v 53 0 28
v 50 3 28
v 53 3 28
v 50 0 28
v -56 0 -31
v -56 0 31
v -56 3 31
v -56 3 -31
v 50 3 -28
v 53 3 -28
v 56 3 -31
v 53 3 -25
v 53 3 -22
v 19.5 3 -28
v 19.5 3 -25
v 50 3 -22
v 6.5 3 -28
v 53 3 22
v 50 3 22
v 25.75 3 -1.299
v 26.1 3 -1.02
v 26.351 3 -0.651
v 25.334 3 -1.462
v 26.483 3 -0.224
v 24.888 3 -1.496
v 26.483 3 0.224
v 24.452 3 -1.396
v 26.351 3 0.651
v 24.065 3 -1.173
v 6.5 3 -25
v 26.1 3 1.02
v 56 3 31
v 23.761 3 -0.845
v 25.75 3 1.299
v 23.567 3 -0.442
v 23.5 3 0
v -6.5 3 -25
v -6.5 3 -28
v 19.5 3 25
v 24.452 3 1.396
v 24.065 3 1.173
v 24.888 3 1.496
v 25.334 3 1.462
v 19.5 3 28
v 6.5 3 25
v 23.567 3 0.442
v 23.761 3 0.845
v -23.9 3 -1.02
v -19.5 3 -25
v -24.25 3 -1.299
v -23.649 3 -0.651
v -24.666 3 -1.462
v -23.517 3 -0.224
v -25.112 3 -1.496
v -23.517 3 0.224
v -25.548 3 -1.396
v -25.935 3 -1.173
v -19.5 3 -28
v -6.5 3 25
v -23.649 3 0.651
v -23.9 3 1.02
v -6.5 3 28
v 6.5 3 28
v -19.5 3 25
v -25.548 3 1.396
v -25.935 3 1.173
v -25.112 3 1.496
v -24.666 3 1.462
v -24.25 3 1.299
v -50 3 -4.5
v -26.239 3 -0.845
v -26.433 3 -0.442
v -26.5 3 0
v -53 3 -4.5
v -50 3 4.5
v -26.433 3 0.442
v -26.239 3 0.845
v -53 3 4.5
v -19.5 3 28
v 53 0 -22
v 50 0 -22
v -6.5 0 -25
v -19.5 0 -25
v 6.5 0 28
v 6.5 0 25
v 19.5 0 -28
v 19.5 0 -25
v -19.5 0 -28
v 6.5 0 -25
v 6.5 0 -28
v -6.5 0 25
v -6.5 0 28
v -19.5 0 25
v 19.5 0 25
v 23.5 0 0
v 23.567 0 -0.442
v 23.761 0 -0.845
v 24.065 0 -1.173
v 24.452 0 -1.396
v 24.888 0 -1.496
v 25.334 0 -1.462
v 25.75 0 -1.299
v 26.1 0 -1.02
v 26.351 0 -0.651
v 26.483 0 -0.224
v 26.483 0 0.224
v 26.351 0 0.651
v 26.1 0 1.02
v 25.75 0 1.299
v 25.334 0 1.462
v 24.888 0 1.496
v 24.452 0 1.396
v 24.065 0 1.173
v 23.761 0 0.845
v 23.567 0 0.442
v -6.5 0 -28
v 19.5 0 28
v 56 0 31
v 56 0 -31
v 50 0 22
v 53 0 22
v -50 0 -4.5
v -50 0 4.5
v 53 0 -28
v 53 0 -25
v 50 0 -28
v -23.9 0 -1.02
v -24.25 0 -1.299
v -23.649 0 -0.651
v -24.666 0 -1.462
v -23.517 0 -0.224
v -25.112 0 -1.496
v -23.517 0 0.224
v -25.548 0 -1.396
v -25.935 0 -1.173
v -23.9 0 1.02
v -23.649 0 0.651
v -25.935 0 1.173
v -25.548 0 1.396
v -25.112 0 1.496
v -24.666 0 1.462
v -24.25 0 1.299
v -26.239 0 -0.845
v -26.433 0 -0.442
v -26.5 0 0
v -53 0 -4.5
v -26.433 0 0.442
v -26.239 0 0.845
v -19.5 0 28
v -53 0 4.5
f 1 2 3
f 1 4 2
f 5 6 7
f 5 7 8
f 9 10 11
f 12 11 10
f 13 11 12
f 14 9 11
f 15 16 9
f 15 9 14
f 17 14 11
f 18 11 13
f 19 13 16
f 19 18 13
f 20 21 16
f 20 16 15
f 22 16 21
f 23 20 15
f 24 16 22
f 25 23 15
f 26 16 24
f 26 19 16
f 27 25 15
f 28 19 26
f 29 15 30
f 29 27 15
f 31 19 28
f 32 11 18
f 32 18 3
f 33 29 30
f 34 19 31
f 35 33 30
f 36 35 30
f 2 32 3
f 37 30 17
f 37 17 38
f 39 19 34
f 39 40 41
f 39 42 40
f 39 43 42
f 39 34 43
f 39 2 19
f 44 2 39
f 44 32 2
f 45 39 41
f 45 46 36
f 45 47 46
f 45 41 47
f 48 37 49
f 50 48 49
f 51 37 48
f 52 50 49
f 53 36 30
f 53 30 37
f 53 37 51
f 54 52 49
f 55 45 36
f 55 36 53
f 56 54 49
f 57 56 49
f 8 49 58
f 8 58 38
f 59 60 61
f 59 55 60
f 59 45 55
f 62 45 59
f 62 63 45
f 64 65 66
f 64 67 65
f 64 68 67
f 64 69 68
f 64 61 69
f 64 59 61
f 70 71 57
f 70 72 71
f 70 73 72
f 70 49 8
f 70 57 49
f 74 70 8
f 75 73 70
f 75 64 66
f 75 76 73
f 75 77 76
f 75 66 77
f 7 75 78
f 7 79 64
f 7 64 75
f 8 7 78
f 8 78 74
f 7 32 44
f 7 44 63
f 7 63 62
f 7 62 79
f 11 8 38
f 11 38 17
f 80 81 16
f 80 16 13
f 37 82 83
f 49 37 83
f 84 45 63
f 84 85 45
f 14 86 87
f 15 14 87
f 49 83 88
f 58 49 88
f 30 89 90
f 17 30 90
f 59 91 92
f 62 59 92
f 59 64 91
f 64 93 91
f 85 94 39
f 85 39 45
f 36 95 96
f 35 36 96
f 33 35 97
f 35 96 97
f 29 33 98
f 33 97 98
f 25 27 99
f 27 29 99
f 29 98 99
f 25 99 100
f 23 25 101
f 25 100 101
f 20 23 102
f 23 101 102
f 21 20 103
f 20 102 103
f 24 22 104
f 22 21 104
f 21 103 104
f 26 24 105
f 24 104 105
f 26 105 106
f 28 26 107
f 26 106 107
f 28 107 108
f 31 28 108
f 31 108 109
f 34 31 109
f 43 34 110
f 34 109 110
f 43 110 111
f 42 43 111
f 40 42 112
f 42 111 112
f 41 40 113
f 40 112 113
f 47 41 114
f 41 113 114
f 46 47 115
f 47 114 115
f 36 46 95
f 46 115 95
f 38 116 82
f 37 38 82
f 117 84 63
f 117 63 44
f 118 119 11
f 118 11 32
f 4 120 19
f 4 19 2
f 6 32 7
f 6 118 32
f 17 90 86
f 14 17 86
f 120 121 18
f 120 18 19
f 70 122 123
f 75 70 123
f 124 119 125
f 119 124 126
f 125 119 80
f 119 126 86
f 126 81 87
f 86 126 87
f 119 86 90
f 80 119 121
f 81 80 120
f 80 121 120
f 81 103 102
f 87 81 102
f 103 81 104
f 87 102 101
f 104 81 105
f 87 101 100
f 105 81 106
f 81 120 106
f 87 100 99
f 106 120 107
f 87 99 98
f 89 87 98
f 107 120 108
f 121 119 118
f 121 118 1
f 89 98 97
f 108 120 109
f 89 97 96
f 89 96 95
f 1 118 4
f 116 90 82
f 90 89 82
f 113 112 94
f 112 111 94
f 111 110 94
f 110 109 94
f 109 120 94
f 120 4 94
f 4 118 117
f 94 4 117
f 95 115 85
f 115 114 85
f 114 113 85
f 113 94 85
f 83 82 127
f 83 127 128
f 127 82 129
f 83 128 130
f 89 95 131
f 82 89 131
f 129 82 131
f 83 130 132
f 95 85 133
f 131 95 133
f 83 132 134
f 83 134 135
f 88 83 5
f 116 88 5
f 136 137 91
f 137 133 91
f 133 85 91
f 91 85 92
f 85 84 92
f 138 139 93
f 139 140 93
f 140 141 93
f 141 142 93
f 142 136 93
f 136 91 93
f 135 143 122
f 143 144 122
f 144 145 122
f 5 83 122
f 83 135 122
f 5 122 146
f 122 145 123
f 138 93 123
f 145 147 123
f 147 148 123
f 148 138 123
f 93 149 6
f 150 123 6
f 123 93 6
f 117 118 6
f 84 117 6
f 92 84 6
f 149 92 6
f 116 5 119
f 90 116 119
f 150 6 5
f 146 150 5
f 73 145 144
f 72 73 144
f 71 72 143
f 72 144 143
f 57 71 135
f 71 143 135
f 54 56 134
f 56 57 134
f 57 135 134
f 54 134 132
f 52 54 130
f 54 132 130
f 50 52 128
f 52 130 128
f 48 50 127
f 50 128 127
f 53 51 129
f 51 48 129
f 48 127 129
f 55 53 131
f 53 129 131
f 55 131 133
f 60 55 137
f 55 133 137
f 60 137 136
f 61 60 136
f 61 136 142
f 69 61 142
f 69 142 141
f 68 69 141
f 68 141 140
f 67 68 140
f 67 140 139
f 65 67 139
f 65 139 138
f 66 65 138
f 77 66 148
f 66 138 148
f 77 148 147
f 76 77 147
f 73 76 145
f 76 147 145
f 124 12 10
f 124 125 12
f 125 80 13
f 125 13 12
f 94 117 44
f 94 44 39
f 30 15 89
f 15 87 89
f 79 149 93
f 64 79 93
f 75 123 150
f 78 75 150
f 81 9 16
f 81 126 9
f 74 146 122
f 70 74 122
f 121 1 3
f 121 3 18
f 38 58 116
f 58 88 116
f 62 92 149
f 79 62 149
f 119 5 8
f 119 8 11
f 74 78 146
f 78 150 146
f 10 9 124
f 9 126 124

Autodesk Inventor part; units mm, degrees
ref_plane "YZ Plane" through (0, 0, 0) normal (1, 0, 0) x (0, 1, 0)
ref_plane "XZ Plane" through (0, 0, 0) normal (0, 1, 0) x (-1, 0, 0)
ref_plane "XY Plane" through (0, 0, 0) normal (0, 0, 1) x (1, 0, 0)
sketch "Boceto1" plane through (0, 0, 0) normal (0, 1, 0) x (-1, 0, 0)
  line L0 (-50, 28) -> (-53, 28)
  line L1 (-50, -28) -> (-50, -22)
  line L2 (-50, -28) -> (-53, -28)
  circle A0 centre (-25, 0) radius 1.5
  circle A1 centre (25, 0) radius 1.5
  line L3 (-53, -25) -> (-53, -28)
  line L4 (-53, -22) -> (-53, -25)
  line L5 (-50, -22) -> (-53, -22)
  line L6 (-50, -28) -> (-50, -22)
  line L7 (-53, -25) -> (-53, -28)
  line L8 (-53, -22) -> (-53, -25)
  line L9 (53, 4.5) -> (53, -4.5)
  line L10 (50, 4.5) -> (53, 4.5)
  line L11 (50, -4.5) -> (50, 4.5)
  line L12 (53, -4.5) -> (50, -4.5)
  line L13 (-50, 22) -> (-50, 28)
  line L14 (-53, 22) -> (-50, 22)
  line L15 (-53, 28) -> (-53, 22)
  line L16 (-50, 28) -> (-53, 28)
  line L17 (19.5, 28) -> (19.5, 25)
  line L18 (6.5, 28) -> (19.5, 28)
  line L19 (6.5, 25) -> (6.5, 28)
  line L20 (19.5, 25) -> (6.5, 25)
  line L21 (56, 31) -> (56, -31)
  line L22 (-56, 31) -> (56, 31)
  line L23 (-56, -31) -> (-56, 31)
  line L24 (56, -31) -> (-56, -31)
  line L25 (-19.5, 28) -> (-19.5, 25)
  line L26 (-6.5, 28) -> (-19.5, 28)
  line L27 (-6.5, 25) -> (-6.5, 28)
  line L28 (-19.5, 25) -> (-6.5, 25)
  line L29 (-19.5, -28) -> (-19.5, -25)
  line L30 (-6.5, -28) -> (-19.5, -28)
  line L31 (-6.5, -25) -> (-6.5, -28)
  line L32 (-19.5, -25) -> (-6.5, -25)
  line L33 (19.5, -25) -> (19.5, -28)
  line L34 (6.5, -25) -> (19.5, -25)
  line L35 (6.5, -28) -> (6.5, -25)
  line L36 (19.5, -28) -> (6.5, -28)
extrude "Extrusión1" add sketch "Boceto1" along normal blind 3
properties part number "Case_Base2" material "MDF Tablero de fibras de densidad media"
